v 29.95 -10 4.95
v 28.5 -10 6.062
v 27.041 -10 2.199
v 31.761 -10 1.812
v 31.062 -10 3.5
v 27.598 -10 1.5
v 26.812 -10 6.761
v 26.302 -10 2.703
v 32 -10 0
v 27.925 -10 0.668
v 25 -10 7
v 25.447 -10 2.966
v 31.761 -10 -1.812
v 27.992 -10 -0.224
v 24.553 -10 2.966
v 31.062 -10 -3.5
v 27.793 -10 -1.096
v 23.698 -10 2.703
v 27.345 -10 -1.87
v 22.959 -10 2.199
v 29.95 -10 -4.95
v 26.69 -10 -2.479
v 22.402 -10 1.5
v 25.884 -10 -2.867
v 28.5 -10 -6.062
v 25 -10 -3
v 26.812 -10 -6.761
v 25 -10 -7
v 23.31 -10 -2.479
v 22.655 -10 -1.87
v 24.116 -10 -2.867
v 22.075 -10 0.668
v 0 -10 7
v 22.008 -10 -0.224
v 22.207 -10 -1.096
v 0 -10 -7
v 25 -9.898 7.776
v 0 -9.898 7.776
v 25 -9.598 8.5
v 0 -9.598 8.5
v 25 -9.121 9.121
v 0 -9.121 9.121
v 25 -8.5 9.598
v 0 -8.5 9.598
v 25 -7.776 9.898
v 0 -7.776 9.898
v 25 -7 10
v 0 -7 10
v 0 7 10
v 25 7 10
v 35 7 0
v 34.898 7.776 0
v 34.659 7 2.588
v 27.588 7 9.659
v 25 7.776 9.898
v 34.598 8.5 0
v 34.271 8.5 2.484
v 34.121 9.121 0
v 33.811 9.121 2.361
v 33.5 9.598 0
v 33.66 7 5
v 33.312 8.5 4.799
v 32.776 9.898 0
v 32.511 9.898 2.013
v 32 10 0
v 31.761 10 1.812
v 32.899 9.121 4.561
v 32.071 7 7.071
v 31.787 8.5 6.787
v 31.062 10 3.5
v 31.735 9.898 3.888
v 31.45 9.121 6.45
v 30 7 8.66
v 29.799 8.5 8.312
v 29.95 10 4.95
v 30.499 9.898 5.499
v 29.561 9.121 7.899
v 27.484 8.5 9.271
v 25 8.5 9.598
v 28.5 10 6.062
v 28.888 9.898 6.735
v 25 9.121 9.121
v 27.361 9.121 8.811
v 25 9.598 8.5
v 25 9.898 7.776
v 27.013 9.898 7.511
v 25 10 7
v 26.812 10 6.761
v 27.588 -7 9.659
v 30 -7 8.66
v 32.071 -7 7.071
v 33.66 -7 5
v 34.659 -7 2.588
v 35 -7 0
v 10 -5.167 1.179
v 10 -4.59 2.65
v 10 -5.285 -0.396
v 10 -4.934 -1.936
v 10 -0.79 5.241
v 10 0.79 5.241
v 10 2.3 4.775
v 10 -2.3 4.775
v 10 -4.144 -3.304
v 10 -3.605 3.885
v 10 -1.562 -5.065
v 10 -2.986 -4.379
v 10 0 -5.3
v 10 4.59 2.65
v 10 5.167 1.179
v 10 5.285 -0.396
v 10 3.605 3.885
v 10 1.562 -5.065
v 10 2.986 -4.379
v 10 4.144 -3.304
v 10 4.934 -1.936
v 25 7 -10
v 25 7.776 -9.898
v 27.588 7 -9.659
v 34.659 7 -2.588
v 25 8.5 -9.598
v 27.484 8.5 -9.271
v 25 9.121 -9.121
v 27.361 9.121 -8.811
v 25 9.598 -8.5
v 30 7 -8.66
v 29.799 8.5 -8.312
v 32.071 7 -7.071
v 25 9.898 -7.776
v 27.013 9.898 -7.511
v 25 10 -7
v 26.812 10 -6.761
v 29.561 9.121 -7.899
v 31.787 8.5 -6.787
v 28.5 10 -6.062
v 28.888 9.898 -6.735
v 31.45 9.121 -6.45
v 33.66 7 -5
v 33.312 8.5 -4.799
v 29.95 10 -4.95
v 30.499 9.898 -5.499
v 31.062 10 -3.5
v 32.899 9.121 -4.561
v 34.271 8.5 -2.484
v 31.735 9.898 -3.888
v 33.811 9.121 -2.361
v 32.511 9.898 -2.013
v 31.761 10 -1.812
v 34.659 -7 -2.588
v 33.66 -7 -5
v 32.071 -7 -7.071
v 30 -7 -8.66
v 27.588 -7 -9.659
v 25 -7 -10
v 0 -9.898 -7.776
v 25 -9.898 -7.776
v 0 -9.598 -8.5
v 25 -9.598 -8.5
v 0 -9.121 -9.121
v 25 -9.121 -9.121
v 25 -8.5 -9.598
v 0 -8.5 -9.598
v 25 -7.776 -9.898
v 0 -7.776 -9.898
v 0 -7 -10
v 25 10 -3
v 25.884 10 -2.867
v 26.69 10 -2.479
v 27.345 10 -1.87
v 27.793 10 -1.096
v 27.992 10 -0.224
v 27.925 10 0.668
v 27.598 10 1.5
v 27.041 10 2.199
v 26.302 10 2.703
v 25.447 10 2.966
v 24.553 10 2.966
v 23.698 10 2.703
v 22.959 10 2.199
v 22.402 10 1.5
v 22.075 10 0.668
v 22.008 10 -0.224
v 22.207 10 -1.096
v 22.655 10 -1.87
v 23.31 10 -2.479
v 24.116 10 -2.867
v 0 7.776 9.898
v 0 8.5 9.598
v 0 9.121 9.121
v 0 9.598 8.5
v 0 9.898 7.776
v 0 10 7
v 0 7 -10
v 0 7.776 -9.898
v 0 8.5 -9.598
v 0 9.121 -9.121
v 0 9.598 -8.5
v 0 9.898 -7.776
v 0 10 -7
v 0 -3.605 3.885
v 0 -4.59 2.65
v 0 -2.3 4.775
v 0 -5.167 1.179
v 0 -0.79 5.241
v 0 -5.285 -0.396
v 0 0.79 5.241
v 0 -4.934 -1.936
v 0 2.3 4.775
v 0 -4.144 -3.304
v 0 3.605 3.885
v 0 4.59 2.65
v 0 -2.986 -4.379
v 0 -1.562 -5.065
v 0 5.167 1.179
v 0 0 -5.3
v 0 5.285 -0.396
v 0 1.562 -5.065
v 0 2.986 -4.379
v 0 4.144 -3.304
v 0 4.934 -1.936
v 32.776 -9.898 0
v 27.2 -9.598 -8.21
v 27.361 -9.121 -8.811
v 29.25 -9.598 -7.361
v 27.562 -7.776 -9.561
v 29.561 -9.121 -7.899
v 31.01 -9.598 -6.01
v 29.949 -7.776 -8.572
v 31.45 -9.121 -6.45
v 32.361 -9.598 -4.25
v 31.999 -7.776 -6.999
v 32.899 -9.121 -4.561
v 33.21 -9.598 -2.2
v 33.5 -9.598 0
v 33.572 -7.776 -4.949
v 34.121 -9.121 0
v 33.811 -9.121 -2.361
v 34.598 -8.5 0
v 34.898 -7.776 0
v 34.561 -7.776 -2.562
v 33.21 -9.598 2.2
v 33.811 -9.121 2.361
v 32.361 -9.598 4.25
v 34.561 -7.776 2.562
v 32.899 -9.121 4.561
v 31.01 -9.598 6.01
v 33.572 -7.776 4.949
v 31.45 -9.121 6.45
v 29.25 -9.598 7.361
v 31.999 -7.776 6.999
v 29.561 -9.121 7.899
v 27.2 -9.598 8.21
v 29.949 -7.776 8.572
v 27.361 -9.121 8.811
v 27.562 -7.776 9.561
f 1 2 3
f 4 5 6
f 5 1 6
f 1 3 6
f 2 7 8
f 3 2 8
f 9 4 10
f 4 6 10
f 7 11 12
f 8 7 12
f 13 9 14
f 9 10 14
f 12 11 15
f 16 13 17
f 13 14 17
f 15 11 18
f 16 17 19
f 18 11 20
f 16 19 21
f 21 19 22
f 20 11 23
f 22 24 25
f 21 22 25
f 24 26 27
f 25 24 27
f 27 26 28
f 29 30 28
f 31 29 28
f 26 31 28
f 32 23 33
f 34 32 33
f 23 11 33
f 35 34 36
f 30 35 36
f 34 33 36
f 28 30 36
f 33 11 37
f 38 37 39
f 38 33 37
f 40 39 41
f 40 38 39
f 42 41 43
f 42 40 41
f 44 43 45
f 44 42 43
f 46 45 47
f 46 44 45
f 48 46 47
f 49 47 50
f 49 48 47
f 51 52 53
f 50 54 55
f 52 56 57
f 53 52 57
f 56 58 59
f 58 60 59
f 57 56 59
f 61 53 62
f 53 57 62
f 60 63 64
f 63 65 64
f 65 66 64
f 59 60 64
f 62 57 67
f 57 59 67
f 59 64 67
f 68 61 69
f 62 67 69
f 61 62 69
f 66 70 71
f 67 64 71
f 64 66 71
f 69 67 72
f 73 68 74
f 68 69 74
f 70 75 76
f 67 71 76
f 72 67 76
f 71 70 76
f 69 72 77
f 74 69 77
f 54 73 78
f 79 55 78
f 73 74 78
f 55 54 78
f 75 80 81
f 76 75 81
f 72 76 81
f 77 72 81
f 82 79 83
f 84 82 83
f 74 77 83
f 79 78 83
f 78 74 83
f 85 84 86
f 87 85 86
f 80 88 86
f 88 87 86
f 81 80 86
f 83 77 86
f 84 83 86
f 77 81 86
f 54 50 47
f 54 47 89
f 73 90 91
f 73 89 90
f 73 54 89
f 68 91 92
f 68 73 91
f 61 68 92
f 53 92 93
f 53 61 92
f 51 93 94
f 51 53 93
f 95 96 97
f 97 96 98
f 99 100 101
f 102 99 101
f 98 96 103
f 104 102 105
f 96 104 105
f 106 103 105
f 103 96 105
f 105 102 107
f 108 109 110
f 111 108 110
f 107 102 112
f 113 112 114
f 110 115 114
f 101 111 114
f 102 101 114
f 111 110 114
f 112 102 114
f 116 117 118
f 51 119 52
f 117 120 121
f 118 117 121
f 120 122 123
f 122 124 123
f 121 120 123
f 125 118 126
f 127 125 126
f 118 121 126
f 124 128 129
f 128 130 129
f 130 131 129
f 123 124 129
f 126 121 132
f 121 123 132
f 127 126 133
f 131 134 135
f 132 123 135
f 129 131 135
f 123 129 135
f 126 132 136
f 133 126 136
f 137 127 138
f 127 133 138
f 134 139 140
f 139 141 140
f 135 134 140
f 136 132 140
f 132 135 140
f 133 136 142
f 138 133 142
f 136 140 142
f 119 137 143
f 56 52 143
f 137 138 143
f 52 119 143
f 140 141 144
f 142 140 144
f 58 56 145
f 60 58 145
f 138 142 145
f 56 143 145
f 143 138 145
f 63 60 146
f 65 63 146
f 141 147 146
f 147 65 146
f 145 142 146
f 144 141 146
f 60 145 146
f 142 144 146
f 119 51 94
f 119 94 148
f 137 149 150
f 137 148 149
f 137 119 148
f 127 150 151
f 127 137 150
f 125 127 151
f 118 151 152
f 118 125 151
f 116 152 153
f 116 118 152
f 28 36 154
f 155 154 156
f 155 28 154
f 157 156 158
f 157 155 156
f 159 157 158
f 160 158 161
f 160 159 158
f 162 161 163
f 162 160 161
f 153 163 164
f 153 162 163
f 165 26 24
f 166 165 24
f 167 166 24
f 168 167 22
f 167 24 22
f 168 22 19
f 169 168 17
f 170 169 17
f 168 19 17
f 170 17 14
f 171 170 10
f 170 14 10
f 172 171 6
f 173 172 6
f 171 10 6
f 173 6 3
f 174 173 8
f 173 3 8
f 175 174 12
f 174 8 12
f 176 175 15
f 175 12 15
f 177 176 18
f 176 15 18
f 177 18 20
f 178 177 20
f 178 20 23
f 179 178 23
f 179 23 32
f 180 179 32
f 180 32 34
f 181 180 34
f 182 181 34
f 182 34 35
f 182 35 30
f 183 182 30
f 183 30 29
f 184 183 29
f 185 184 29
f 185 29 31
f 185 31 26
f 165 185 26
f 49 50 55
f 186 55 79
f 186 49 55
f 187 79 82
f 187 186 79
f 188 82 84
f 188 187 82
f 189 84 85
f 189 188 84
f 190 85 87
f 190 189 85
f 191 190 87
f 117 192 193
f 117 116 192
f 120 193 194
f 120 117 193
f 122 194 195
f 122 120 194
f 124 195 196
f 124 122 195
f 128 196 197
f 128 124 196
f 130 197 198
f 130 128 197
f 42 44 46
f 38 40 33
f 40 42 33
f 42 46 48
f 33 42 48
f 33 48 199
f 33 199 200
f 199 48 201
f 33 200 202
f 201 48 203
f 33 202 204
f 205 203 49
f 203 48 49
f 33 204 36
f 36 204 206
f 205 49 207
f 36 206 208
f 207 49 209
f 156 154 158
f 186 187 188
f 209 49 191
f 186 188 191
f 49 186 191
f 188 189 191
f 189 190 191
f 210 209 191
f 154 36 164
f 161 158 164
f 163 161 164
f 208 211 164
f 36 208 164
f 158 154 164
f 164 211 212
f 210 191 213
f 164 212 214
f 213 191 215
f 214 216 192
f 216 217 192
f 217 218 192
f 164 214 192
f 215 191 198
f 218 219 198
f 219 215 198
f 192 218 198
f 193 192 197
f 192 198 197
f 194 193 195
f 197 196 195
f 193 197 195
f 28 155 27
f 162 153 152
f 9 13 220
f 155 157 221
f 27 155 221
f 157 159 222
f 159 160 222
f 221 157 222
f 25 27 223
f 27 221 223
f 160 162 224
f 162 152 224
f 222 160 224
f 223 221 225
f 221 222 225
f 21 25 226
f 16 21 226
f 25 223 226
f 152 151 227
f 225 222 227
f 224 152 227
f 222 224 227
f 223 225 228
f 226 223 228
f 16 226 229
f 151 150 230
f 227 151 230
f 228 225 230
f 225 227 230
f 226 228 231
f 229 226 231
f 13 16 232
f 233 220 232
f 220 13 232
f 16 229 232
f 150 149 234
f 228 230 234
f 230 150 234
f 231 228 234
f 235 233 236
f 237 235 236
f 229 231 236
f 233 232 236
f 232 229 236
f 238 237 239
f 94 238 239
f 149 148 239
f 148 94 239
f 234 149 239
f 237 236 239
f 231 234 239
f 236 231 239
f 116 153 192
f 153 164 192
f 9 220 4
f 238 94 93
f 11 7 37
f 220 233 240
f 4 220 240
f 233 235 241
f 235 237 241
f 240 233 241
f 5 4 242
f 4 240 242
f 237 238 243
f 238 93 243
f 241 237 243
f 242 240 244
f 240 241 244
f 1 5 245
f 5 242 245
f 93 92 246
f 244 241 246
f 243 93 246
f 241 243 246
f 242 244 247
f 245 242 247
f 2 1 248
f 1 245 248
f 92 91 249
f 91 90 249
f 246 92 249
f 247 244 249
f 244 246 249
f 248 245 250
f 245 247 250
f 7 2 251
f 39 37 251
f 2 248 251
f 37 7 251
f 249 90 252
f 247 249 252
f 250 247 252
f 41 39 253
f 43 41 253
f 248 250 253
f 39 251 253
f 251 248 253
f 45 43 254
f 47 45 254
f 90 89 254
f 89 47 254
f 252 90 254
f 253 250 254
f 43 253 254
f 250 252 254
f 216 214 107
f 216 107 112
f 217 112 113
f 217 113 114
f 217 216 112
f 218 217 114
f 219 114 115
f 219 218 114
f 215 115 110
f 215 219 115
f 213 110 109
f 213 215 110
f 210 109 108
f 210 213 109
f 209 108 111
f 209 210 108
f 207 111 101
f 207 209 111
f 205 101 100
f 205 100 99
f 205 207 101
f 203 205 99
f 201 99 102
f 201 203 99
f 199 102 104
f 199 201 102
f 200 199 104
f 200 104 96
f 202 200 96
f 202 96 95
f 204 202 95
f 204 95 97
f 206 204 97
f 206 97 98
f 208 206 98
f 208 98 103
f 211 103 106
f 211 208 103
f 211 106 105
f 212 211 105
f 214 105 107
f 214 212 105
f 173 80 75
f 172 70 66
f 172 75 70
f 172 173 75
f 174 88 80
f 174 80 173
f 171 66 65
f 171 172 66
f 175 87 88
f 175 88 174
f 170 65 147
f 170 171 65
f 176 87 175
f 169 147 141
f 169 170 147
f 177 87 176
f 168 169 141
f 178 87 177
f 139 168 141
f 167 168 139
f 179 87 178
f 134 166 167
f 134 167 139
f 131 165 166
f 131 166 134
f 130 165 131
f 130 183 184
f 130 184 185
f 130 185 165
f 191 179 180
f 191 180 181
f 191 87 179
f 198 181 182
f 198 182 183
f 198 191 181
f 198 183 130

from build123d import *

# Parameters (mm, degrees)
SKETCH1_W                = 20
SKETCH1_H                = 20
SKETCH1_R                = 5.3
BOSS_EXTRUDE1_DEPTH      = 10
SKETCH2_W                = 20
SKETCH2_H                = 20
BOSS_EXTRUDE2_DEPTH      = 5
BOSS_EXTRUDE6_DEPTH      = 20
BOSS_EXTRUDE6_DEPTH_BACK = 5
SKETCH9_W                = 20
SKETCH9_H                = 20
F_6_0_6_DIAMETER_HOLE3_D = 6
FILLET3_R                = 10
FILLET6_R                = 3


with BuildPart() as part:
    # Sketch1 → Boss-Extrude1 (new body)
    with BuildSketch(Plane(origin=(0, 0, 0), x_dir=(0, 0, -1), z_dir=(1, 0, 0))):
        Rectangle(SKETCH1_W, SKETCH1_H)
        Circle(SKETCH1_R, mode=Mode.SUBTRACT)
    extrude(amount=BOSS_EXTRUDE1_DEPTH)

    # Sketch2 → Boss-Extrude2 (add)
    with BuildSketch(Plane(origin=(10, 0, 0), x_dir=(0, 0, -1), z_dir=(1, 0, 0))):
        Rectangle(SKETCH2_W, SKETCH2_H)
    extrude(amount=BOSS_EXTRUDE2_DEPTH)

    # Sketch9 → Boss-Extrude6 (add, two sides: drawn at the far end of the back side and taken through both)
    with BuildSketch(Plane(origin=(15, 0, 0), x_dir=(0, 0, -1), z_dir=(1, 0, 0)).offset(-BOSS_EXTRUDE6_DEPTH_BACK)):
        Rectangle(SKETCH9_W, SKETCH9_H)
    extrude(amount=BOSS_EXTRUDE6_DEPTH + BOSS_EXTRUDE6_DEPTH_BACK)

    # Ø6.0 (6) Diameter Hole3 (through all)
    with Locations(Plane(origin=(25, 10, 0), x_dir=(0, 0, 1), z_dir=(0, 1, 0))):
        with Locations((0, 0)):
            Hole(F_6_0_6_DIAMETER_HOLE3_D / 2)

    # Fillet3
    fillet3_edges = [part.edges().sort_by_distance(p)[0] for p in [
        (35, 0, -10),
        (35, 0, 10),
    ]]
    fillet(fillet3_edges, radius=FILLET3_R - 0.0001)  # a hair under: the kernel refuses the full size

    # Fillet6
    fillet6_edges = [part.edges().sort_by_distance(p)[0] for p in [
        (12.50005, -10, -10),
        (12.50005, -10, 10),
        (32.071097101, -10, -7.071097101),
        (32.071097101, -10, 7.071097101),
        (12.50005, 10, 10),
        (12.50005, 10, -10),
        (32.071097101, 10, -7.071097101),
        (32.071097101, 10, 7.071097101),
    ]]
    fillet(fillet6_edges, radius=FILLET6_R)


solid = part.part
